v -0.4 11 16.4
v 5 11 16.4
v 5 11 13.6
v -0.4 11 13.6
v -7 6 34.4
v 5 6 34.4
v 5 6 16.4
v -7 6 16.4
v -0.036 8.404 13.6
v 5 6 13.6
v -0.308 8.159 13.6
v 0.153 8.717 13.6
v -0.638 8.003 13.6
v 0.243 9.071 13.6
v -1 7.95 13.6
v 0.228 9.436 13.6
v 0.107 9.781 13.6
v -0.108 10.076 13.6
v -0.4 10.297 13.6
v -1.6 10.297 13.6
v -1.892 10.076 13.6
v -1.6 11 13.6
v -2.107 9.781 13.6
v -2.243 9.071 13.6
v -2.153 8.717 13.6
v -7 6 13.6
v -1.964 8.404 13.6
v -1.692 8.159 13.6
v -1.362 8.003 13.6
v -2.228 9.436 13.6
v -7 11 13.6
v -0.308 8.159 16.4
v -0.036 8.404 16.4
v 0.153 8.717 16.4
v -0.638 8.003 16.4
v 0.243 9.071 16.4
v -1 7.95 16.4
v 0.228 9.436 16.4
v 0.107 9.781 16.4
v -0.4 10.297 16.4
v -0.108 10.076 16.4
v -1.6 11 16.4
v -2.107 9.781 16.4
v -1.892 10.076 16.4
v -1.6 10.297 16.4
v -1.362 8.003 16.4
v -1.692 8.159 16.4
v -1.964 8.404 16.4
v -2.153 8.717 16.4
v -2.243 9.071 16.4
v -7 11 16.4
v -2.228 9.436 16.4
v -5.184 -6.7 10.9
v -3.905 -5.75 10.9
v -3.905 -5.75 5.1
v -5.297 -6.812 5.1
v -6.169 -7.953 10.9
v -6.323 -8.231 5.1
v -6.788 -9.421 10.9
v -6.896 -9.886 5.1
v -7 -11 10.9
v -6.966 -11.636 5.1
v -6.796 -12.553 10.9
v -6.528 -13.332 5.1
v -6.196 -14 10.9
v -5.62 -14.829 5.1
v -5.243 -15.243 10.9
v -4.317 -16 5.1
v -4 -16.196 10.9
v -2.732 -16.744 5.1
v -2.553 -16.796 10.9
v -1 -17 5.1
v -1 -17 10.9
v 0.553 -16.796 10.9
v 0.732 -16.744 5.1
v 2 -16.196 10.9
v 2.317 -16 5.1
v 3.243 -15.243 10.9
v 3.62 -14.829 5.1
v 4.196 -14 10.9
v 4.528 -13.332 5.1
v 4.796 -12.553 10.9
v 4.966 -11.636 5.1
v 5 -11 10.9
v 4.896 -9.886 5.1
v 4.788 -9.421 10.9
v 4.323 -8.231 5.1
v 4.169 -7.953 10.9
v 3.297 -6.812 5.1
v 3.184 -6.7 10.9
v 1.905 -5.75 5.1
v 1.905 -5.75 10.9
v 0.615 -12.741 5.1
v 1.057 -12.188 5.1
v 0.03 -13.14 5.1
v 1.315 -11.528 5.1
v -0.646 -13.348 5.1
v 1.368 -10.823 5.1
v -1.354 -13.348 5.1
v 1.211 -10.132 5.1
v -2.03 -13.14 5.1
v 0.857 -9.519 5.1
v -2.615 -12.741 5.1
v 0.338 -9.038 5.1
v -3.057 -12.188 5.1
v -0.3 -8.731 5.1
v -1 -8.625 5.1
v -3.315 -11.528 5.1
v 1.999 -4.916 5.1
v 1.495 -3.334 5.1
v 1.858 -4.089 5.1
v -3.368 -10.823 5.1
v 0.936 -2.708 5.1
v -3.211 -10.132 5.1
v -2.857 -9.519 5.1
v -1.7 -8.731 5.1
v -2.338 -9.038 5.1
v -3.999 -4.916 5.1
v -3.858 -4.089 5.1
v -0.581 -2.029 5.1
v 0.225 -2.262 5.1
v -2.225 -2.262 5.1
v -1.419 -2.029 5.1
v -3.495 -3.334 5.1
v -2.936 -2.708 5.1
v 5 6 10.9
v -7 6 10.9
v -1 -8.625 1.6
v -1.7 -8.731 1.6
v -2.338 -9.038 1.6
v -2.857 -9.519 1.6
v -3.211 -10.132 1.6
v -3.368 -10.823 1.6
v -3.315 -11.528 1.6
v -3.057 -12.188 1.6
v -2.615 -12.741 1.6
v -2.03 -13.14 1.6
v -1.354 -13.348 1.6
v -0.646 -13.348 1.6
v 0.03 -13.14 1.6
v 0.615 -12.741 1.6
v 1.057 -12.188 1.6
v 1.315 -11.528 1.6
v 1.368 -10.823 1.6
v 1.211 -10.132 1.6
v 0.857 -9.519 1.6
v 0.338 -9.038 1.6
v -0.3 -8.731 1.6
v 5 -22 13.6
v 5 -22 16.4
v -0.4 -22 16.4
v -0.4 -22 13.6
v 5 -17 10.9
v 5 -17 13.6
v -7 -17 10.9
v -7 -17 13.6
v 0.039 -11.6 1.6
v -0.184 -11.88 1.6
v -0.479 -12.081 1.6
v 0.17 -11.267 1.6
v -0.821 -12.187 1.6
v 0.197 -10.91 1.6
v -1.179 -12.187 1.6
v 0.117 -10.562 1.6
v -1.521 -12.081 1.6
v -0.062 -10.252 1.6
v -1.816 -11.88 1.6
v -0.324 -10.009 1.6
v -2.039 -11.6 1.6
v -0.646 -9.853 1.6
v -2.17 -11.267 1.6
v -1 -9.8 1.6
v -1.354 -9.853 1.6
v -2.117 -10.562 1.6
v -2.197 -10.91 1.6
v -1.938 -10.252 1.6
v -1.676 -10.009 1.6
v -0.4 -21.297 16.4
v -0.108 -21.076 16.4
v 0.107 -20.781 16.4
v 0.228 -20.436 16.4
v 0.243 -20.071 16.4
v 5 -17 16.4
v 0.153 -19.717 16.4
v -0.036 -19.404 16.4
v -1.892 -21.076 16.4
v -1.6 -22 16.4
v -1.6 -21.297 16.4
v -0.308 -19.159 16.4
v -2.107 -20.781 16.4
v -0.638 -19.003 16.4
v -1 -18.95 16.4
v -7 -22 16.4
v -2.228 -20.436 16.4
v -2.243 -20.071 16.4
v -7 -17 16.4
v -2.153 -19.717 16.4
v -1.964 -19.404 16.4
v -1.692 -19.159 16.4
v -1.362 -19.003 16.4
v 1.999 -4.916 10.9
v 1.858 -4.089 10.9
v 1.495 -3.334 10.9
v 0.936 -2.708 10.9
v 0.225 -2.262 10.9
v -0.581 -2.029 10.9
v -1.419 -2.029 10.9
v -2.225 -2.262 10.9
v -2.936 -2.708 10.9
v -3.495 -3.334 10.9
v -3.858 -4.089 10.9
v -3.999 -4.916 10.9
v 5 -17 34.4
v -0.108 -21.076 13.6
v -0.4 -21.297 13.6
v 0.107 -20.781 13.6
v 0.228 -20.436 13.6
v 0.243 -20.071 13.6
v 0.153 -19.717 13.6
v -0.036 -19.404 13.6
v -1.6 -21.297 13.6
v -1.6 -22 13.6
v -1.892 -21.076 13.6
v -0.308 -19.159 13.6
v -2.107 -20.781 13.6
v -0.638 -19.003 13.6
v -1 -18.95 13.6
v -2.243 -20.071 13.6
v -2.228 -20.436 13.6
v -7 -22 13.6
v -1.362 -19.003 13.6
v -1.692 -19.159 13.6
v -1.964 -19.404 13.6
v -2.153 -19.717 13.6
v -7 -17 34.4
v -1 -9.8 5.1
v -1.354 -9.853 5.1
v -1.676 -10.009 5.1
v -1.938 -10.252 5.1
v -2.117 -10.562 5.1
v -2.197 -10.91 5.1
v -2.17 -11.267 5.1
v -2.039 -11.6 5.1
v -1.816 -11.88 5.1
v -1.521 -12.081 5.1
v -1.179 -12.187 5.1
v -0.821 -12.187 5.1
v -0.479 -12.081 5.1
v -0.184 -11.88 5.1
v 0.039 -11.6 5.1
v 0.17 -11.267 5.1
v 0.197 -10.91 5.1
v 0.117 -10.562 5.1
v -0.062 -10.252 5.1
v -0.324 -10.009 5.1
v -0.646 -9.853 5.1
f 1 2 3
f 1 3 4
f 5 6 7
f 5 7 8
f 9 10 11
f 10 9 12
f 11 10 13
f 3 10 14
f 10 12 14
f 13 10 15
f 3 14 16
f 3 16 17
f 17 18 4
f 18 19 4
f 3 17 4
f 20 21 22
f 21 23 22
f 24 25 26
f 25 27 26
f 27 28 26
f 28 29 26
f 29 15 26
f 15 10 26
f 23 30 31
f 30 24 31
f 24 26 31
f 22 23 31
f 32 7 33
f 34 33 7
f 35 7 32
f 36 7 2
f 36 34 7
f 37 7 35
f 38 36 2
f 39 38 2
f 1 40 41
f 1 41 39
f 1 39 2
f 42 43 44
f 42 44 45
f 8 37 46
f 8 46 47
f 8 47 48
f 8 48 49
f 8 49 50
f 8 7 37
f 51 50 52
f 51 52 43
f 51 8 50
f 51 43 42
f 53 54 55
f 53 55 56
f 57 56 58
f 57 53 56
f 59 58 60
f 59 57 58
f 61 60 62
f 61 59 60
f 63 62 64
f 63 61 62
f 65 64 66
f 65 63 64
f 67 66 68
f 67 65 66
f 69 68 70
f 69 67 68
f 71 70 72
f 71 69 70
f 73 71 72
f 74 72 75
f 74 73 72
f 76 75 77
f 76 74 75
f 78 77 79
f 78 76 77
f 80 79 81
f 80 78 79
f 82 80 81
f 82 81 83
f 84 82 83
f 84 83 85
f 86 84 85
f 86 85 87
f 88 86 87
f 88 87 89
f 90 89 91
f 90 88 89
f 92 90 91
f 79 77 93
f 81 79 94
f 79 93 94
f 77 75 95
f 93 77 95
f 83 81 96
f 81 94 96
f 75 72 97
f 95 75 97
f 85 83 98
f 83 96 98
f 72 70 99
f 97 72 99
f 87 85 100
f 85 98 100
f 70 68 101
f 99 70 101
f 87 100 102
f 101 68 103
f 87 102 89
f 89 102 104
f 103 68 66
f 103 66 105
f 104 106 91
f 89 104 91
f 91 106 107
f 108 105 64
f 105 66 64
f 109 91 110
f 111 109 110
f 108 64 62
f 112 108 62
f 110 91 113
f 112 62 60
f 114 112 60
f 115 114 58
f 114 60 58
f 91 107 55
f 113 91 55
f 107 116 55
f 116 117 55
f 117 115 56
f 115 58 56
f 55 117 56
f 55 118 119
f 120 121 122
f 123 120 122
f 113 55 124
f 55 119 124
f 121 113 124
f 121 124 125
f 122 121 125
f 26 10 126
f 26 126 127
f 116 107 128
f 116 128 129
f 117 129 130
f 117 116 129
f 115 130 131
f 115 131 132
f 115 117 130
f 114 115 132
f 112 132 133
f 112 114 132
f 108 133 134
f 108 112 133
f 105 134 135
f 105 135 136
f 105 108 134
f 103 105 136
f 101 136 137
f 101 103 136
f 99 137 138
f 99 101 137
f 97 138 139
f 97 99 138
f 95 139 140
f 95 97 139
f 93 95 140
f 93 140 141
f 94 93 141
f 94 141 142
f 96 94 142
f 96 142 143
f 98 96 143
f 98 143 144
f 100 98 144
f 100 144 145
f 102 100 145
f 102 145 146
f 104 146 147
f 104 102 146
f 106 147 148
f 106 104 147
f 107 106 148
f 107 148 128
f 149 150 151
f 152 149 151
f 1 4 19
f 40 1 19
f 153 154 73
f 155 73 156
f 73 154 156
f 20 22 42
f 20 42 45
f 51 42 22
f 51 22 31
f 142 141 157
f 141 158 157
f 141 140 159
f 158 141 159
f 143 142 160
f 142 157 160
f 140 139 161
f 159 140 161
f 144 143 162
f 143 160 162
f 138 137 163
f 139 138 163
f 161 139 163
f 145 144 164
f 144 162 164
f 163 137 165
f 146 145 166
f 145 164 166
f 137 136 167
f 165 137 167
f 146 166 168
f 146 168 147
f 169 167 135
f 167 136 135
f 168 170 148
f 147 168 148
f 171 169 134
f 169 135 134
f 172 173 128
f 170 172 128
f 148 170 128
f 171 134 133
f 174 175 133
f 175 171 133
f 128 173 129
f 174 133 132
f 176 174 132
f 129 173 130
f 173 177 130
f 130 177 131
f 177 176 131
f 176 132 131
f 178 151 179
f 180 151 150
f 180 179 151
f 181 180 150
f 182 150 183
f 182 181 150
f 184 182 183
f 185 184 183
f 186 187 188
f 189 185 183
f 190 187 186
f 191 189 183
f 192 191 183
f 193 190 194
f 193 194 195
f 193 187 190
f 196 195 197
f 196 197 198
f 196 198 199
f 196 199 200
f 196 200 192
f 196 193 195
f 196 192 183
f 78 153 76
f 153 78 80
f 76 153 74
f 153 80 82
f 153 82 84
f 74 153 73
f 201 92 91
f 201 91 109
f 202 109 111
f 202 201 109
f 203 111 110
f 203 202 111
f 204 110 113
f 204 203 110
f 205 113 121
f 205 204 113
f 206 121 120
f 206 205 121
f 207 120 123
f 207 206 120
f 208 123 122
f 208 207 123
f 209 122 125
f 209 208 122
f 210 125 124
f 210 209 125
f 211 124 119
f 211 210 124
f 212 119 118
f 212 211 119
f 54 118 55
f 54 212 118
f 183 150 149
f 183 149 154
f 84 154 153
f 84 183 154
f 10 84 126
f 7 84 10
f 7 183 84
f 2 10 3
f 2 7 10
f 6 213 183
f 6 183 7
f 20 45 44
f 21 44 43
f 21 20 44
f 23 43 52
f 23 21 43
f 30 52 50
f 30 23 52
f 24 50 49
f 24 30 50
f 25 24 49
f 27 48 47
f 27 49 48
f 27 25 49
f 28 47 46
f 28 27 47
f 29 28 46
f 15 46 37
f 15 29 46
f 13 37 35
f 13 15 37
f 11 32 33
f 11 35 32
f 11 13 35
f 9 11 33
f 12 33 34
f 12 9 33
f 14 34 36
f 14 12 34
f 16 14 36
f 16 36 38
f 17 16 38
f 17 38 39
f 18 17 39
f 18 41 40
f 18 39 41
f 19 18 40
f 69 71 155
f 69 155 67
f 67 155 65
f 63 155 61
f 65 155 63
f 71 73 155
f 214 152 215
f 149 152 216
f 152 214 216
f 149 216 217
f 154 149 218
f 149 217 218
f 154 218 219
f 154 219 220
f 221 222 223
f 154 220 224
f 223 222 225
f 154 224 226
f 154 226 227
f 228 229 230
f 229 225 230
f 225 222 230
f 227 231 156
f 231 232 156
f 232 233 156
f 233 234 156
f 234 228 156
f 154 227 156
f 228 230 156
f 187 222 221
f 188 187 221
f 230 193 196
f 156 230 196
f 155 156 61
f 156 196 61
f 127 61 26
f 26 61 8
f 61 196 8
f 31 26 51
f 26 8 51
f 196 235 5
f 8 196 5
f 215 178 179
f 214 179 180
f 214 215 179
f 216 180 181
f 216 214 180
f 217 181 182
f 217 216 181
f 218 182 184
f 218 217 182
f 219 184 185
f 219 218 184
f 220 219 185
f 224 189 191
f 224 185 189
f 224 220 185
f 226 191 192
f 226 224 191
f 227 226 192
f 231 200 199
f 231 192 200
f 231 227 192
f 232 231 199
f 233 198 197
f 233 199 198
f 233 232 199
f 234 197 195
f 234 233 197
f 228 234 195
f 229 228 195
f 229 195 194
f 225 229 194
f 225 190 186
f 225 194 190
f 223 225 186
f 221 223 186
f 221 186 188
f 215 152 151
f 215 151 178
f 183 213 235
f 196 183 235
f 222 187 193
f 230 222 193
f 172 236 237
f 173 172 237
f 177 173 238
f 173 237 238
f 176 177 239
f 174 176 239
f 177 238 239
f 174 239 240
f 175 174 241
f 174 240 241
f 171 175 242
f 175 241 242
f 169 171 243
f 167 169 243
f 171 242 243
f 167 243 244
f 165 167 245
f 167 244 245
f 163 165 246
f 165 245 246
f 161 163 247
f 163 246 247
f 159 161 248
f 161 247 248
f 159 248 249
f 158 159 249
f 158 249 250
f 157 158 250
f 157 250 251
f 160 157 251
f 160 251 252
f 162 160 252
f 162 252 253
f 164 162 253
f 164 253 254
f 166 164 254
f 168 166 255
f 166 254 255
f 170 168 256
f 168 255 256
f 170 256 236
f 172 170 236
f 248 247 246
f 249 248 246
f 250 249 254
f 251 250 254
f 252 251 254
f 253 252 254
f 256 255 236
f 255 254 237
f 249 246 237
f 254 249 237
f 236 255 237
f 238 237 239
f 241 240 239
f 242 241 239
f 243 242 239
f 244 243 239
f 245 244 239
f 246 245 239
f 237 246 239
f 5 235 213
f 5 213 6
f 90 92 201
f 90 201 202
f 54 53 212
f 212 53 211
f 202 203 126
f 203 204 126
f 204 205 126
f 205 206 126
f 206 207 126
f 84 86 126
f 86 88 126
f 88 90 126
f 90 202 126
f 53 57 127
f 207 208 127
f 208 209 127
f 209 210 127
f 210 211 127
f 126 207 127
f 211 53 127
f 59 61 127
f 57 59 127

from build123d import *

# Parameters (mm, degrees)
SKETCH063_W             = 23
SKETCH063_H             = 12
PAD032_DEPTH            = 23.5
SKETCH064_W             = 5
SKETCH064_H             = 12
PAD033_DEPTH            = 2.8
POCKET026_DEPTH         = 5
PAD034_DEPTH            = 5.8
SKETCH067_R             = 2.375
SKETCH067_R_2           = 1.2
PAD035_DEPTH            = 3.5
BODY010_ROLL_ANGLE      = -90
BODY010_PLACEMENT_ANGLE = 90


with BuildPart() as part:
    # Sketch063 → Pad032 (new body)
    with BuildSketch(Plane.XZ):
        with Locations((11.5, 6)):
            Rectangle(SKETCH063_W, SKETCH063_H)
    extrude(amount=-PAD032_DEPTH)

    # Sketch064 → Pad033 (join)
    with BuildSketch(Plane.XZ.offset(-18)):
        with Locations((-2.5, 6)):
            Rectangle(SKETCH064_W, SKETCH064_H)
        with Locations((25.5, 6)):
            Rectangle(SKETCH064_W, SKETCH064_H)
    extrude(amount=-PAD033_DEPTH)

    # Sketch065 → Pocket026 (cut)
    with BuildSketch(Plane(origin=(-3.2, 20.8, 6), x_dir=(1, 0, 0), z_dir=(0, -1, 0))):
        with BuildLine():
            ThreePointArc((-1.096586, -0.6), (1.25, 0), (-1.096586, 0.6))
            Line((-1.8, 0.6), (-1.096586, 0.6))
            Line((-1.8, 0), (-1.8, 0.6))
            Line((-1.8, 0), (-1.8, -0.6))
            Line((-1.8, -0.6), (-1.096586, -0.6))
        make_face()
        with BuildLine():
            ThreePointArc((30.496586, 0.6), (28.15, 0), (30.496586, -0.6))
            Line((31.2, -0.6), (30.496586, -0.6))
            Line((31.2, 0), (31.2, -0.6))
            Line((31.2, 0), (31.2, 0.6))
            Line((31.2, 0.6), (30.496586, 0.6))
        make_face()
    extrude(amount=POCKET026_DEPTH, mode=Mode.SUBTRACT)

    # Sketch066 → Pad034 (join)
    with BuildSketch(Plane(origin=(6, 23.5, 6), x_dir=(1, 0, 0), z_dir=(0, -1, 0))):
        with BuildLine():
            ThreePointArc((5.25, 2.904738), (-6, 0), (5.25, -2.904738))
            ThreePointArc((5.25, -2.904738), (9, 0), (5.25, 2.904738))
        make_face()
    extrude(amount=-PAD034_DEPTH)

    # Sketch067 → Pad035 (join)
    with BuildSketch(Plane(origin=(6, 29.3, 6), x_dir=(1, 0, 0), z_dir=(0, -1, 0))):
        Circle(SKETCH067_R)
        Circle(SKETCH067_R_2, mode=Mode.SUBTRACT)
    extrude(amount=-PAD035_DEPTH)


with BuildPart() as part_1:
    # Body010 roll: moved
    add(part.part.rotate(Axis((0, 0, 0), (1, 0, 0)), BODY010_ROLL_ANGLE))


with BuildPart() as part_2:
    # Body010 placement: moved
    add(part_1.part.moved(Location((5, -17, 34.4))).rotate(Axis((5, -17, 34.4), (0, 0, 1)), BODY010_PLACEMENT_ANGLE))


solid = part_2.part
